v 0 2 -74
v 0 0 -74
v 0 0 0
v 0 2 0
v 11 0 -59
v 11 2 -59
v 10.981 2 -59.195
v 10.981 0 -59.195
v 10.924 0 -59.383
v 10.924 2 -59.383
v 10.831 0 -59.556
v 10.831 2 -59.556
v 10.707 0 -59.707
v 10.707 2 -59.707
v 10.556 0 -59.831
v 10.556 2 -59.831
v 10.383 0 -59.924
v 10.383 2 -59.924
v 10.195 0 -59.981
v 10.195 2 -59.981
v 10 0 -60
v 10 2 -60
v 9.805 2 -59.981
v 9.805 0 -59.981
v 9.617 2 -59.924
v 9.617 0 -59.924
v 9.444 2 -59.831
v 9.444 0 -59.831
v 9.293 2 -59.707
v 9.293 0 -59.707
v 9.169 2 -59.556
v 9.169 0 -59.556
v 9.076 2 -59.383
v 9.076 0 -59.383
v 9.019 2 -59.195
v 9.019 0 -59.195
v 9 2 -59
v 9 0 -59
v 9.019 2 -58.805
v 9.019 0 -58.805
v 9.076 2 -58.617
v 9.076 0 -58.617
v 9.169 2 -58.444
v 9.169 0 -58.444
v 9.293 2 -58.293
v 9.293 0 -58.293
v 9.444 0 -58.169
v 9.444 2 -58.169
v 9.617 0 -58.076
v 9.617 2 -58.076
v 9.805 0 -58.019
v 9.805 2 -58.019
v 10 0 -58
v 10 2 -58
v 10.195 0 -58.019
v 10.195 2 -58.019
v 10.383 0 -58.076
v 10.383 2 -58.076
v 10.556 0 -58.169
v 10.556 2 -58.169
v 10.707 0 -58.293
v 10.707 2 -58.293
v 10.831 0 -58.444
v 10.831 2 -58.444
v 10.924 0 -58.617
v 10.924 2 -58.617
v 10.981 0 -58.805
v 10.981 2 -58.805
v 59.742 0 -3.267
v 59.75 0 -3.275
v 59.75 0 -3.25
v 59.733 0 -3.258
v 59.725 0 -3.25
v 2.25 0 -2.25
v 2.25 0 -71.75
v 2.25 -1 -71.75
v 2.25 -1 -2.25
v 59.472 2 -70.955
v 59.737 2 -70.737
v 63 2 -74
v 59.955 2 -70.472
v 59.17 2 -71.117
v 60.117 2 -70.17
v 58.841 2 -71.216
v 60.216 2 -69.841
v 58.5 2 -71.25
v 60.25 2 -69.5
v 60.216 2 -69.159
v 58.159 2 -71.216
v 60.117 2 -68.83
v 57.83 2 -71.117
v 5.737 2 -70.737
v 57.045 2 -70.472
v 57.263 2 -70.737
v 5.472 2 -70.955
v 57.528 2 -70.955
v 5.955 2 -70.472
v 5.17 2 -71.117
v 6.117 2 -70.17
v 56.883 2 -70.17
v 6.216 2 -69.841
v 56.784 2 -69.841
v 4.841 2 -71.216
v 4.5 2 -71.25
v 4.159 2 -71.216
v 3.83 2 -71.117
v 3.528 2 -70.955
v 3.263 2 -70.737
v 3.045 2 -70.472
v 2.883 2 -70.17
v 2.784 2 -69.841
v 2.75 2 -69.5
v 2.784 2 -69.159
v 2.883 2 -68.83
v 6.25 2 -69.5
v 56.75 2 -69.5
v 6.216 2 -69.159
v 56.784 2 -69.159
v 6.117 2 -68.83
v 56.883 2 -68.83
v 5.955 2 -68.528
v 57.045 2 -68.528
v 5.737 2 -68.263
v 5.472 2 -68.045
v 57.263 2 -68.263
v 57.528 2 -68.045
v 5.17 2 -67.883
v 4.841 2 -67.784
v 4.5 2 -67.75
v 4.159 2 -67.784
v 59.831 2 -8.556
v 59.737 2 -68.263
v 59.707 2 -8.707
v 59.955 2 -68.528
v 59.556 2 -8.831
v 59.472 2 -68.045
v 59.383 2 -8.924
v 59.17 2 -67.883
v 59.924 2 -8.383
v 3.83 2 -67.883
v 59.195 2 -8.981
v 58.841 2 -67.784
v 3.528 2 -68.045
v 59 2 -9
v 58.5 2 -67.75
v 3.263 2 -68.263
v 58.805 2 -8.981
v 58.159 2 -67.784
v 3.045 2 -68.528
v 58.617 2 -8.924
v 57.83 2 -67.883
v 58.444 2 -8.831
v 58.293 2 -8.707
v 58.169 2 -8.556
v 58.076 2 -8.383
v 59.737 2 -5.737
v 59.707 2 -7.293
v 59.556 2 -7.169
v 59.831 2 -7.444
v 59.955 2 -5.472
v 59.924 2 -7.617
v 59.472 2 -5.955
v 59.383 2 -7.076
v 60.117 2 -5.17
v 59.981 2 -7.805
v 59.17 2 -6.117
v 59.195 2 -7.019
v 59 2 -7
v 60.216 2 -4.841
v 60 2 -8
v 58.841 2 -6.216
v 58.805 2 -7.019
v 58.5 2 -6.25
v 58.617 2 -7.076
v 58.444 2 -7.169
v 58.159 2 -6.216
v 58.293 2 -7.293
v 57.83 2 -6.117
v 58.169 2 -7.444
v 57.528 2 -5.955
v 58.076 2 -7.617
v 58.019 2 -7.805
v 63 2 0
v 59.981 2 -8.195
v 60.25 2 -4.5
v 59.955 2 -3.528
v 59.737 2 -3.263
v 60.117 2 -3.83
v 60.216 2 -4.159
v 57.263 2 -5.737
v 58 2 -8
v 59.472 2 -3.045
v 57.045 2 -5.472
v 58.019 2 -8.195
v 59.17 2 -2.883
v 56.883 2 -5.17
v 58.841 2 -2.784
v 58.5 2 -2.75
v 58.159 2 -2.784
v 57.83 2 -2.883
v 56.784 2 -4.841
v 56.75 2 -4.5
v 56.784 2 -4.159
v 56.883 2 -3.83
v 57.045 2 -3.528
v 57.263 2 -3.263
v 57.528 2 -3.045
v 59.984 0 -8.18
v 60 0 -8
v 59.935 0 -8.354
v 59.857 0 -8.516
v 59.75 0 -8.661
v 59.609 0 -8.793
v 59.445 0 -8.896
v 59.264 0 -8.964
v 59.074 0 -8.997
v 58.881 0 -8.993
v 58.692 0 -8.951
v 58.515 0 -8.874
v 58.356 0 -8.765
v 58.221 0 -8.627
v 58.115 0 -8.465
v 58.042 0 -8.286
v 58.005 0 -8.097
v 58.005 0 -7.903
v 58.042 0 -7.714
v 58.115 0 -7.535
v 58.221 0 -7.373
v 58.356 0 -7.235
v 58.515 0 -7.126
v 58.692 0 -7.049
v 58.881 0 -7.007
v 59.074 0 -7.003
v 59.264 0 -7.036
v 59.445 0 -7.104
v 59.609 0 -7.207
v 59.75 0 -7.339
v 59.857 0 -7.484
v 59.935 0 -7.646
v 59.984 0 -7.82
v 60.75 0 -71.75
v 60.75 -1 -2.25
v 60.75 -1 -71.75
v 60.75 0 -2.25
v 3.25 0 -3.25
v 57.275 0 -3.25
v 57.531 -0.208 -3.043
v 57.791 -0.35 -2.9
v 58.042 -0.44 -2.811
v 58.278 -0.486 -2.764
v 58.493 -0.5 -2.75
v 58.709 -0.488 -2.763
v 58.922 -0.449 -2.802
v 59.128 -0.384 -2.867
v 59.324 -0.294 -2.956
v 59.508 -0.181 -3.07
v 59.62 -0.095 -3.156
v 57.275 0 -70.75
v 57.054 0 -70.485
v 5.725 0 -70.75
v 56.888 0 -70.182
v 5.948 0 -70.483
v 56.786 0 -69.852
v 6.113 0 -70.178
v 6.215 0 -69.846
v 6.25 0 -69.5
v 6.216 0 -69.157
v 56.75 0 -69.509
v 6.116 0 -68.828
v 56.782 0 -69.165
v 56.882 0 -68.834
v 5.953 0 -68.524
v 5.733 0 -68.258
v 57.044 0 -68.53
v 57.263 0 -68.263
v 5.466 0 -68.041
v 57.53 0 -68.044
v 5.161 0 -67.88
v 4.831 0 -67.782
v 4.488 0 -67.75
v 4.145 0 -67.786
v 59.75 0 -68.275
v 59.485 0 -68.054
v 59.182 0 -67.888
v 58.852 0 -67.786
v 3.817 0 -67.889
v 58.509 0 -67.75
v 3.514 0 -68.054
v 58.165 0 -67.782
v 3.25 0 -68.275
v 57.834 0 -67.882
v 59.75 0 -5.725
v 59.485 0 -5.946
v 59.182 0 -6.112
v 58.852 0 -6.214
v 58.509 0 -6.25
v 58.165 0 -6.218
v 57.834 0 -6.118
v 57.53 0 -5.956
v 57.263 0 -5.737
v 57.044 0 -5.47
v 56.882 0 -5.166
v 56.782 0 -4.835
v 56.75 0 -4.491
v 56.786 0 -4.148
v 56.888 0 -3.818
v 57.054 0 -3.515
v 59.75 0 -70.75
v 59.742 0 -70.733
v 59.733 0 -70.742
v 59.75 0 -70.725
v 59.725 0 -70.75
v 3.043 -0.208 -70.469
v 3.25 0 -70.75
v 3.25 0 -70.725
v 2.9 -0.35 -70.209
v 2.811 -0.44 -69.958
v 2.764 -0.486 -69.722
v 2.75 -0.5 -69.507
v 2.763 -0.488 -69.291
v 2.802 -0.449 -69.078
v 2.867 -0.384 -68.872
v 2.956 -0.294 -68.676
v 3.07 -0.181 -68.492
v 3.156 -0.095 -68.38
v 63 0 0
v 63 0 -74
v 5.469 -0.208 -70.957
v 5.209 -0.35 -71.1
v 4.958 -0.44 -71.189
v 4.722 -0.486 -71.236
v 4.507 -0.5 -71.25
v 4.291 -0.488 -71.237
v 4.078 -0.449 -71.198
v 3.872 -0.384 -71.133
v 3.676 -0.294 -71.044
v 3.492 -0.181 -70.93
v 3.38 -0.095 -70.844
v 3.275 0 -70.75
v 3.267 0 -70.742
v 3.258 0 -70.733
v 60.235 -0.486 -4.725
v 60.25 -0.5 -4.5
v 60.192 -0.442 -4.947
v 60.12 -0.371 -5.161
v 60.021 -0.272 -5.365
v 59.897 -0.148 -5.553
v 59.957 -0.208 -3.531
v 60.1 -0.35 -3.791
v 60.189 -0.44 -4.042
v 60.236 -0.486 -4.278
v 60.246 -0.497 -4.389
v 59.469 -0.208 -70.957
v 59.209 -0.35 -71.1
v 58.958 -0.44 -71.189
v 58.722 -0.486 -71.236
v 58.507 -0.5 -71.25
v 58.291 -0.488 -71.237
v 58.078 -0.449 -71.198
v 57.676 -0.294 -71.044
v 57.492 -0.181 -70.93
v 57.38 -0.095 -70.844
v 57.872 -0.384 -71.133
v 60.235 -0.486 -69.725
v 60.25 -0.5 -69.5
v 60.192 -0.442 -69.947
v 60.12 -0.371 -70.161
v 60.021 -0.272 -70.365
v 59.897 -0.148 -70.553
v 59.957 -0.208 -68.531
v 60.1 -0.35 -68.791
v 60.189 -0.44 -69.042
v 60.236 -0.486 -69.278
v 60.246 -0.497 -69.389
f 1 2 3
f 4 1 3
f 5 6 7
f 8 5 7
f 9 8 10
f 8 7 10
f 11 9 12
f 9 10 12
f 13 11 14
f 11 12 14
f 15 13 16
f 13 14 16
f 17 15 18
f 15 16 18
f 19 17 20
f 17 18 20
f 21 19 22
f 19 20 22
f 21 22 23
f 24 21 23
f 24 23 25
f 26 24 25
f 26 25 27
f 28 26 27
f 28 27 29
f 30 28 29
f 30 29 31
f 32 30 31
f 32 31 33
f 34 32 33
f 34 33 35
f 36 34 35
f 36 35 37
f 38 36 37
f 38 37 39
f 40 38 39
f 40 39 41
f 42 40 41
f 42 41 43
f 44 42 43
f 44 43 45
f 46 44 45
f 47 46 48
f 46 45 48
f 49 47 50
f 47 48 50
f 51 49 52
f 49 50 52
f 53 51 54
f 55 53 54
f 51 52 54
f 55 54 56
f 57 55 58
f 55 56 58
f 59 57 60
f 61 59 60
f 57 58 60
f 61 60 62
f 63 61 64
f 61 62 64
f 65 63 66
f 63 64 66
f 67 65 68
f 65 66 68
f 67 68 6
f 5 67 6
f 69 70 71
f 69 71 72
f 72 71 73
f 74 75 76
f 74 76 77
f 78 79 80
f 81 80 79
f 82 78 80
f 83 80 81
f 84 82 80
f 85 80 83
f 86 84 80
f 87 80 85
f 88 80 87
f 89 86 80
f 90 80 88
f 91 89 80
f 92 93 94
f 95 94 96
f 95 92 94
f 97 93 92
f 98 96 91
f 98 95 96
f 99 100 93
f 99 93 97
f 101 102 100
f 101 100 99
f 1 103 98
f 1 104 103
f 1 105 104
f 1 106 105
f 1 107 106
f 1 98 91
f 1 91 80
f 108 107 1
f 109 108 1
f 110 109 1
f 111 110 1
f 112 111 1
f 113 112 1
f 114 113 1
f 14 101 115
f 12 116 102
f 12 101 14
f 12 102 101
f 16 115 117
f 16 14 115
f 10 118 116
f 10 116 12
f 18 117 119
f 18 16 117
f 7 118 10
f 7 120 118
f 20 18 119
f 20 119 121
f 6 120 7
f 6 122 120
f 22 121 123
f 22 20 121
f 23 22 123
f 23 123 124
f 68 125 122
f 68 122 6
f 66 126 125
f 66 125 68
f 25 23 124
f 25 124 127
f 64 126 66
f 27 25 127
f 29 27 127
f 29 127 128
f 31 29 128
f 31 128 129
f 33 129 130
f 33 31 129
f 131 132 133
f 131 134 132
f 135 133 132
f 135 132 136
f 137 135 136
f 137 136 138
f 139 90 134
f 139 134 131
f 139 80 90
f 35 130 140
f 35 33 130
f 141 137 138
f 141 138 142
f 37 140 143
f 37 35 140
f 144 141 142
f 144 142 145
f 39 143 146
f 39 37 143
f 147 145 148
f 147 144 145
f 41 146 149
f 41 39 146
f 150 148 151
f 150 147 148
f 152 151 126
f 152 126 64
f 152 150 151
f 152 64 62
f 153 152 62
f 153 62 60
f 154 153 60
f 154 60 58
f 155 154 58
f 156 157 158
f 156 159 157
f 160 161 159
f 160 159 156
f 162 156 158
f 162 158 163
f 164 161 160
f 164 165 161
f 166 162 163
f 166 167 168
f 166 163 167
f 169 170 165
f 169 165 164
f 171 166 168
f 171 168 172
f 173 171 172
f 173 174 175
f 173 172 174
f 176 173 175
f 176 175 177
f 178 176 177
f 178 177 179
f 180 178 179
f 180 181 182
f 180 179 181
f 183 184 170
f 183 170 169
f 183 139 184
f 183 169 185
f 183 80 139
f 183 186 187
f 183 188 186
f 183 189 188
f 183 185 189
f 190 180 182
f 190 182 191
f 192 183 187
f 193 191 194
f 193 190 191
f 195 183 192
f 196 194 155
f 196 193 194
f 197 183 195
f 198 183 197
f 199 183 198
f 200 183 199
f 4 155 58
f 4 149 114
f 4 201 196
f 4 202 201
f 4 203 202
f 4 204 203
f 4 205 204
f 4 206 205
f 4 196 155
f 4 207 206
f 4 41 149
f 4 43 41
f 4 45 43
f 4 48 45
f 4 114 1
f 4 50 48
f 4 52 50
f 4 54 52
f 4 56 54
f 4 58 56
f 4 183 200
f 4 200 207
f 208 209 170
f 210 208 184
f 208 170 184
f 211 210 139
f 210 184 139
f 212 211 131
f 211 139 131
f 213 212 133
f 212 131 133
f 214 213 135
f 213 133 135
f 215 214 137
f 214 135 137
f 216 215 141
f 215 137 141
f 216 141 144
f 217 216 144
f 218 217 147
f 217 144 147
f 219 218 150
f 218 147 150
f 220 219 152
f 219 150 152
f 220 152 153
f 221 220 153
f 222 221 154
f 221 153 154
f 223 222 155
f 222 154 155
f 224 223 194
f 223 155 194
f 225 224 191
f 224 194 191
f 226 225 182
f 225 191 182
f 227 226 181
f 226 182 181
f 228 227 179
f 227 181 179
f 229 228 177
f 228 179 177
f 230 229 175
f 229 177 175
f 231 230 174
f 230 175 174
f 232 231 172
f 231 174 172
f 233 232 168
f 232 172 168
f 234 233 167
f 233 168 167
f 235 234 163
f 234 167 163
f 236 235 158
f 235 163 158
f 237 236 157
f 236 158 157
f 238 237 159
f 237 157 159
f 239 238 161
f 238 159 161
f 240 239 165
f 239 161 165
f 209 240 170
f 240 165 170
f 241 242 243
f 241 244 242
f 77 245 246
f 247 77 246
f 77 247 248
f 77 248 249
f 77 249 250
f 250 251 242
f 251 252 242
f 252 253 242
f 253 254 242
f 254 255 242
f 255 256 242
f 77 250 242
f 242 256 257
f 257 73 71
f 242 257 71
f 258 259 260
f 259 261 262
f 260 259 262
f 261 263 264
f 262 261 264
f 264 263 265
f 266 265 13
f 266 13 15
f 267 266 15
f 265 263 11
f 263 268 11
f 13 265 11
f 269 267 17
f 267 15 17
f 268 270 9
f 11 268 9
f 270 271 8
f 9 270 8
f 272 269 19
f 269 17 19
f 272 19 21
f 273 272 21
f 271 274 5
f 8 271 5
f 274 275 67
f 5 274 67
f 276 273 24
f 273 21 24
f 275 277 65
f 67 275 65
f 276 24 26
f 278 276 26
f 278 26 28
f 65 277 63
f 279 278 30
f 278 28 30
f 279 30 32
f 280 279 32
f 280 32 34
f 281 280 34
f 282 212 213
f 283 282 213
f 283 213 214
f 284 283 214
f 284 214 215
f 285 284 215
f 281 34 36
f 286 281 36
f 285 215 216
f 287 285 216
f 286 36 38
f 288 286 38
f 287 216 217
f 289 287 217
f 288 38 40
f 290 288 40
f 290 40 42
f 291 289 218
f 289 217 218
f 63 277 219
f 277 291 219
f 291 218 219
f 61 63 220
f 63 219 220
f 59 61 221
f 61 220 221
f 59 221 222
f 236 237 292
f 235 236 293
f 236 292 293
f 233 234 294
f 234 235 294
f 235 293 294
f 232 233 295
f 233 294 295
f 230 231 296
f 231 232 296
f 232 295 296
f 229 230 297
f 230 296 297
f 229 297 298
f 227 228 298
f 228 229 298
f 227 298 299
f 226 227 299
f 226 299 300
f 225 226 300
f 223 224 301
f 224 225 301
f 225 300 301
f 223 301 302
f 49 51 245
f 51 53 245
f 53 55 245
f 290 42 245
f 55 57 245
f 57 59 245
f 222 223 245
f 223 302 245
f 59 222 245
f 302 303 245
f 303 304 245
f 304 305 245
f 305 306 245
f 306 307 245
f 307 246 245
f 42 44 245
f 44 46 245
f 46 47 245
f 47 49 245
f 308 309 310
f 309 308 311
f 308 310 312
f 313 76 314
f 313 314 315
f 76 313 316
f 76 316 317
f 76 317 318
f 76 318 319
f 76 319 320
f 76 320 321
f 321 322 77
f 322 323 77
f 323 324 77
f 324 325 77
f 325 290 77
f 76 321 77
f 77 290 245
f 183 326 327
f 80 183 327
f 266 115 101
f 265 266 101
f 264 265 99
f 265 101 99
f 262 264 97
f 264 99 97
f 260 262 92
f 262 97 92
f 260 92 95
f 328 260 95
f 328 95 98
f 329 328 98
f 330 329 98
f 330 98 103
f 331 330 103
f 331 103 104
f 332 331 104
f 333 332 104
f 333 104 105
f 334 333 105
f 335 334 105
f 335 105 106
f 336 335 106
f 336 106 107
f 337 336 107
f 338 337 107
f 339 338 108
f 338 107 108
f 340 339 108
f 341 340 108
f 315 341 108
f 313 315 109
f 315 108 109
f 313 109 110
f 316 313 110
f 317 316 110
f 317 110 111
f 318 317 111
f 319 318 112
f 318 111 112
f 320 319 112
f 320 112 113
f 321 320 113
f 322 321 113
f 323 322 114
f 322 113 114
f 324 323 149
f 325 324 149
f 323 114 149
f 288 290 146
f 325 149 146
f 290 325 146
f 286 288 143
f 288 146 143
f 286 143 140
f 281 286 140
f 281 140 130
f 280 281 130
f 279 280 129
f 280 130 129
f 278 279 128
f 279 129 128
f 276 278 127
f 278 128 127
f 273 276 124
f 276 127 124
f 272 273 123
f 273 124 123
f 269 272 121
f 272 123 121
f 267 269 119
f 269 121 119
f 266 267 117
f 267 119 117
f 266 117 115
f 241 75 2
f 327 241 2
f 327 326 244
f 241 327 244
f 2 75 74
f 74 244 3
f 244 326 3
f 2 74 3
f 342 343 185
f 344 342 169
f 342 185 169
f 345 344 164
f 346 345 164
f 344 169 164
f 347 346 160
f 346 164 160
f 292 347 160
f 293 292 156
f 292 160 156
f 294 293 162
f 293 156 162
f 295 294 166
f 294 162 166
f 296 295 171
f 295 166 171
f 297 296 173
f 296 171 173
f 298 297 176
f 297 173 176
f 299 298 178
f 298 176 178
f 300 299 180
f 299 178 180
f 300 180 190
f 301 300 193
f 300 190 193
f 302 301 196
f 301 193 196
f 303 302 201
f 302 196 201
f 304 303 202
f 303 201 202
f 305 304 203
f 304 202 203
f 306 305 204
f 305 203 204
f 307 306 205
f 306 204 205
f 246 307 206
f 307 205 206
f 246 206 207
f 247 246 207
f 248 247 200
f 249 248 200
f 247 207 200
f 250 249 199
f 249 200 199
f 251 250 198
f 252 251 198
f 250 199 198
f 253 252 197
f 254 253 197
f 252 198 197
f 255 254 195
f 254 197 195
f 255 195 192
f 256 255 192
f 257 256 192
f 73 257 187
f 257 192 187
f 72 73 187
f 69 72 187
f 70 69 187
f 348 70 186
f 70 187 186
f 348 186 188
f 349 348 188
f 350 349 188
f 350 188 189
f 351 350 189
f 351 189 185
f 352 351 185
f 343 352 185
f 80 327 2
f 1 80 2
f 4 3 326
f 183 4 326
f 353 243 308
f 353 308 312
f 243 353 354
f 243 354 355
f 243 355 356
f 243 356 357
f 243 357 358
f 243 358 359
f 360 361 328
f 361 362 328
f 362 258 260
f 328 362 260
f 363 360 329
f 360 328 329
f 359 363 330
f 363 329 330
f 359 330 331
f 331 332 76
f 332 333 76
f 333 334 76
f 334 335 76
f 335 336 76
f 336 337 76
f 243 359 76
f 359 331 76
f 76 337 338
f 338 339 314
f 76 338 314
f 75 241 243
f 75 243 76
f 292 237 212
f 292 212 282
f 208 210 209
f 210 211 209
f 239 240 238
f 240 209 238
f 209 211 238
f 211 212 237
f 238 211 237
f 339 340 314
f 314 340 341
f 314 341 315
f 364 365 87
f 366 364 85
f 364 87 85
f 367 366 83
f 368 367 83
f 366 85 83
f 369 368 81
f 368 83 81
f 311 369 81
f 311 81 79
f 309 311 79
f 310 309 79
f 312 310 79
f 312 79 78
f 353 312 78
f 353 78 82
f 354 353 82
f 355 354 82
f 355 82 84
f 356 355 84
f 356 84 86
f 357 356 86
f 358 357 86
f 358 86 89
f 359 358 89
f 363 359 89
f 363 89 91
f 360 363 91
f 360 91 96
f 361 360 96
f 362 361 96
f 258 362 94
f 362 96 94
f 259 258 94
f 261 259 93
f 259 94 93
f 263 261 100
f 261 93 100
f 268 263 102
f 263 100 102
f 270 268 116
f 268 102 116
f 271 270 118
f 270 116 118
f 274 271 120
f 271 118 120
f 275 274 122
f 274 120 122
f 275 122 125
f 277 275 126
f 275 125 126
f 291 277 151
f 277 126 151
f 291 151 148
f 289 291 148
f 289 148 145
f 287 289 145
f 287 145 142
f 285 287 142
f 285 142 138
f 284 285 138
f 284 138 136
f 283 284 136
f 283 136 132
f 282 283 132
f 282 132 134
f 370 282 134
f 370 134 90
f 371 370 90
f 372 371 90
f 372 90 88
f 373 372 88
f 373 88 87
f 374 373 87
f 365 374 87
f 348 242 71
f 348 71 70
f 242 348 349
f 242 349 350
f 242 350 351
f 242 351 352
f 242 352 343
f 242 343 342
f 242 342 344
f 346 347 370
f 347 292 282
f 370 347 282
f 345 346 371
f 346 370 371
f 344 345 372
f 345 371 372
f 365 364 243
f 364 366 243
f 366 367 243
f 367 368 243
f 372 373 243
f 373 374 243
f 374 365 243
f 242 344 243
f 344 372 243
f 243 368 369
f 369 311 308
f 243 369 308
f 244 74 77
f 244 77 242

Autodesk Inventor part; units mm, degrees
ref_plane "YZ Plane" through (0, 0, 0) normal (1, 0, 0) x (0, 1, 0)
ref_plane "XZ Plane" through (0, 0, 0) normal (0, 1, 0) x (-1, 0, 0)
ref_plane "XY Plane" through (0, 0, 0) normal (0, 0, 1) x (1, 0, 0)
sketch "Sketch1" plane through (0, 0, 0) normal (0, 1, 0) x (-1, 0, 0)
  line L0 (0, 0) -> (-63, 0)
  line L1 (-63, 0) -> (-63, -74)
  line L2 (-63, -74) -> (0, -74)
  line L3 (0, -74) -> (0, 0)
  dimension "d0" = 63
  dimension "d1" = 74
extrude "Extrusion1" add sketch "Sketch1" along normal blind 2
sketch "Sketch2" plane through (0, 2, 0) normal (0, 1, 0) x (1, 0, 0)
  circle A0 centre (59, 8) radius 1
  line L0 (0, 0) -> (63, 0) projected
  line L1 (63, 0) -> (63, 74) projected
  circle A1 centre (10, 59) radius 1
  line L2 (63, 74) -> (0, 74) projected
  line L3 (0, 74) -> (0, 0) projected
  dimension "d4" = 2
  dimension "d5" = 8
  dimension "d6" = 4
  dimension "d7" = 2
  dimension "d8" = 15
  dimension "d9" = 10
extrude "Extrusion2" cut sketch "Sketch2" against normal up to next contours A0 | A1
sketch "Sketch3" plane through (0, 0, 0) normal (0, -1, 0) x (1, 0, 0)
  line L0 (2.25, -2.25) -> (60.75, -2.25)
  line L1 (60.75, -2.25) -> (60.75, -71.75)
  line L2 (60.75, -71.75) -> (2.25, -71.75)
  line L3 (2.25, -71.75) -> (2.25, -2.25)
  line L4 (0, 0) -> (63, 0) projected
  line L5 (0, -74) -> (0, 0) projected
  line L6 (3.25, -3.25) -> (59.75, -3.25)
  line L7 (59.75, -3.25) -> (59.75, -70.75)
  line L8 (59.75, -70.75) -> (3.25, -70.75)
  line L9 (3.25, -70.75) -> (3.25, -3.25)
  dimension "d12" = 58.5
  dimension "d13" = 69.5
  dimension "d14" = 2.25
  dimension "d15" = 2.25
  dimension "d16" = 56.5
  dimension "d17" = 67.5
  dimension "d18" = 1
  dimension "d19" = 1
extrude "Extrusion3" add sketch "Sketch3" along normal blind 1
chamfer "Chamfer1" distance 1 angle 45 1 edges at (3.25, -1, -37) measured on face at (3.25, -0.3333, -48.25)
chamfer "Chamfer2" distance 1 angle 45 1 edges at (31.5, -1, -3.25) measured on face at (40.9167, -0.3335, -3.25)
chamfer "Chamfer3" distance 1 angle 45 1 edges at (59.75, -1, -37) measured on face at (59.75, -0.6667, -27.5538)
chamfer "Chamfer4" distance 1 angle 45 1 edges at (31.5, -1, -70.75) measured on face at (22.0833, -0.6668, -70.75)
sketch "Sketch4" plane through (0, 2, 0) normal (0, 1, 0) x (1, 0, 0)
  circle A0 centre (4.5, 69.5) radius 1.75
  line L0 (63, 74) -> (0, 74) projected
  line L1 (0, 74) -> (0, 0) projected
  circle A1 centre (58.5, 69.5) radius 1.75
  line L2 (63, 0) -> (63, 74) projected
  circle A2 centre (58.5, 4.5) radius 1.75
  line L3 (0, 0) -> (63, 0) projected
  dimension "d34" = 3.5
  dimension "d35" = 4.5
  dimension "d36" = 4.5
  dimension "d37" = 3.5
  dimension "d38" = 4.5
  dimension "d39" = 4.5
  dimension "d40" = 3.5
  dimension "d41" = 4.5
  dimension "d42" = 4.5
extrude "Extrusion4" cut sketch "Sketch4" against normal up to next contours A0 | A1 | A2
properties part number "top"
